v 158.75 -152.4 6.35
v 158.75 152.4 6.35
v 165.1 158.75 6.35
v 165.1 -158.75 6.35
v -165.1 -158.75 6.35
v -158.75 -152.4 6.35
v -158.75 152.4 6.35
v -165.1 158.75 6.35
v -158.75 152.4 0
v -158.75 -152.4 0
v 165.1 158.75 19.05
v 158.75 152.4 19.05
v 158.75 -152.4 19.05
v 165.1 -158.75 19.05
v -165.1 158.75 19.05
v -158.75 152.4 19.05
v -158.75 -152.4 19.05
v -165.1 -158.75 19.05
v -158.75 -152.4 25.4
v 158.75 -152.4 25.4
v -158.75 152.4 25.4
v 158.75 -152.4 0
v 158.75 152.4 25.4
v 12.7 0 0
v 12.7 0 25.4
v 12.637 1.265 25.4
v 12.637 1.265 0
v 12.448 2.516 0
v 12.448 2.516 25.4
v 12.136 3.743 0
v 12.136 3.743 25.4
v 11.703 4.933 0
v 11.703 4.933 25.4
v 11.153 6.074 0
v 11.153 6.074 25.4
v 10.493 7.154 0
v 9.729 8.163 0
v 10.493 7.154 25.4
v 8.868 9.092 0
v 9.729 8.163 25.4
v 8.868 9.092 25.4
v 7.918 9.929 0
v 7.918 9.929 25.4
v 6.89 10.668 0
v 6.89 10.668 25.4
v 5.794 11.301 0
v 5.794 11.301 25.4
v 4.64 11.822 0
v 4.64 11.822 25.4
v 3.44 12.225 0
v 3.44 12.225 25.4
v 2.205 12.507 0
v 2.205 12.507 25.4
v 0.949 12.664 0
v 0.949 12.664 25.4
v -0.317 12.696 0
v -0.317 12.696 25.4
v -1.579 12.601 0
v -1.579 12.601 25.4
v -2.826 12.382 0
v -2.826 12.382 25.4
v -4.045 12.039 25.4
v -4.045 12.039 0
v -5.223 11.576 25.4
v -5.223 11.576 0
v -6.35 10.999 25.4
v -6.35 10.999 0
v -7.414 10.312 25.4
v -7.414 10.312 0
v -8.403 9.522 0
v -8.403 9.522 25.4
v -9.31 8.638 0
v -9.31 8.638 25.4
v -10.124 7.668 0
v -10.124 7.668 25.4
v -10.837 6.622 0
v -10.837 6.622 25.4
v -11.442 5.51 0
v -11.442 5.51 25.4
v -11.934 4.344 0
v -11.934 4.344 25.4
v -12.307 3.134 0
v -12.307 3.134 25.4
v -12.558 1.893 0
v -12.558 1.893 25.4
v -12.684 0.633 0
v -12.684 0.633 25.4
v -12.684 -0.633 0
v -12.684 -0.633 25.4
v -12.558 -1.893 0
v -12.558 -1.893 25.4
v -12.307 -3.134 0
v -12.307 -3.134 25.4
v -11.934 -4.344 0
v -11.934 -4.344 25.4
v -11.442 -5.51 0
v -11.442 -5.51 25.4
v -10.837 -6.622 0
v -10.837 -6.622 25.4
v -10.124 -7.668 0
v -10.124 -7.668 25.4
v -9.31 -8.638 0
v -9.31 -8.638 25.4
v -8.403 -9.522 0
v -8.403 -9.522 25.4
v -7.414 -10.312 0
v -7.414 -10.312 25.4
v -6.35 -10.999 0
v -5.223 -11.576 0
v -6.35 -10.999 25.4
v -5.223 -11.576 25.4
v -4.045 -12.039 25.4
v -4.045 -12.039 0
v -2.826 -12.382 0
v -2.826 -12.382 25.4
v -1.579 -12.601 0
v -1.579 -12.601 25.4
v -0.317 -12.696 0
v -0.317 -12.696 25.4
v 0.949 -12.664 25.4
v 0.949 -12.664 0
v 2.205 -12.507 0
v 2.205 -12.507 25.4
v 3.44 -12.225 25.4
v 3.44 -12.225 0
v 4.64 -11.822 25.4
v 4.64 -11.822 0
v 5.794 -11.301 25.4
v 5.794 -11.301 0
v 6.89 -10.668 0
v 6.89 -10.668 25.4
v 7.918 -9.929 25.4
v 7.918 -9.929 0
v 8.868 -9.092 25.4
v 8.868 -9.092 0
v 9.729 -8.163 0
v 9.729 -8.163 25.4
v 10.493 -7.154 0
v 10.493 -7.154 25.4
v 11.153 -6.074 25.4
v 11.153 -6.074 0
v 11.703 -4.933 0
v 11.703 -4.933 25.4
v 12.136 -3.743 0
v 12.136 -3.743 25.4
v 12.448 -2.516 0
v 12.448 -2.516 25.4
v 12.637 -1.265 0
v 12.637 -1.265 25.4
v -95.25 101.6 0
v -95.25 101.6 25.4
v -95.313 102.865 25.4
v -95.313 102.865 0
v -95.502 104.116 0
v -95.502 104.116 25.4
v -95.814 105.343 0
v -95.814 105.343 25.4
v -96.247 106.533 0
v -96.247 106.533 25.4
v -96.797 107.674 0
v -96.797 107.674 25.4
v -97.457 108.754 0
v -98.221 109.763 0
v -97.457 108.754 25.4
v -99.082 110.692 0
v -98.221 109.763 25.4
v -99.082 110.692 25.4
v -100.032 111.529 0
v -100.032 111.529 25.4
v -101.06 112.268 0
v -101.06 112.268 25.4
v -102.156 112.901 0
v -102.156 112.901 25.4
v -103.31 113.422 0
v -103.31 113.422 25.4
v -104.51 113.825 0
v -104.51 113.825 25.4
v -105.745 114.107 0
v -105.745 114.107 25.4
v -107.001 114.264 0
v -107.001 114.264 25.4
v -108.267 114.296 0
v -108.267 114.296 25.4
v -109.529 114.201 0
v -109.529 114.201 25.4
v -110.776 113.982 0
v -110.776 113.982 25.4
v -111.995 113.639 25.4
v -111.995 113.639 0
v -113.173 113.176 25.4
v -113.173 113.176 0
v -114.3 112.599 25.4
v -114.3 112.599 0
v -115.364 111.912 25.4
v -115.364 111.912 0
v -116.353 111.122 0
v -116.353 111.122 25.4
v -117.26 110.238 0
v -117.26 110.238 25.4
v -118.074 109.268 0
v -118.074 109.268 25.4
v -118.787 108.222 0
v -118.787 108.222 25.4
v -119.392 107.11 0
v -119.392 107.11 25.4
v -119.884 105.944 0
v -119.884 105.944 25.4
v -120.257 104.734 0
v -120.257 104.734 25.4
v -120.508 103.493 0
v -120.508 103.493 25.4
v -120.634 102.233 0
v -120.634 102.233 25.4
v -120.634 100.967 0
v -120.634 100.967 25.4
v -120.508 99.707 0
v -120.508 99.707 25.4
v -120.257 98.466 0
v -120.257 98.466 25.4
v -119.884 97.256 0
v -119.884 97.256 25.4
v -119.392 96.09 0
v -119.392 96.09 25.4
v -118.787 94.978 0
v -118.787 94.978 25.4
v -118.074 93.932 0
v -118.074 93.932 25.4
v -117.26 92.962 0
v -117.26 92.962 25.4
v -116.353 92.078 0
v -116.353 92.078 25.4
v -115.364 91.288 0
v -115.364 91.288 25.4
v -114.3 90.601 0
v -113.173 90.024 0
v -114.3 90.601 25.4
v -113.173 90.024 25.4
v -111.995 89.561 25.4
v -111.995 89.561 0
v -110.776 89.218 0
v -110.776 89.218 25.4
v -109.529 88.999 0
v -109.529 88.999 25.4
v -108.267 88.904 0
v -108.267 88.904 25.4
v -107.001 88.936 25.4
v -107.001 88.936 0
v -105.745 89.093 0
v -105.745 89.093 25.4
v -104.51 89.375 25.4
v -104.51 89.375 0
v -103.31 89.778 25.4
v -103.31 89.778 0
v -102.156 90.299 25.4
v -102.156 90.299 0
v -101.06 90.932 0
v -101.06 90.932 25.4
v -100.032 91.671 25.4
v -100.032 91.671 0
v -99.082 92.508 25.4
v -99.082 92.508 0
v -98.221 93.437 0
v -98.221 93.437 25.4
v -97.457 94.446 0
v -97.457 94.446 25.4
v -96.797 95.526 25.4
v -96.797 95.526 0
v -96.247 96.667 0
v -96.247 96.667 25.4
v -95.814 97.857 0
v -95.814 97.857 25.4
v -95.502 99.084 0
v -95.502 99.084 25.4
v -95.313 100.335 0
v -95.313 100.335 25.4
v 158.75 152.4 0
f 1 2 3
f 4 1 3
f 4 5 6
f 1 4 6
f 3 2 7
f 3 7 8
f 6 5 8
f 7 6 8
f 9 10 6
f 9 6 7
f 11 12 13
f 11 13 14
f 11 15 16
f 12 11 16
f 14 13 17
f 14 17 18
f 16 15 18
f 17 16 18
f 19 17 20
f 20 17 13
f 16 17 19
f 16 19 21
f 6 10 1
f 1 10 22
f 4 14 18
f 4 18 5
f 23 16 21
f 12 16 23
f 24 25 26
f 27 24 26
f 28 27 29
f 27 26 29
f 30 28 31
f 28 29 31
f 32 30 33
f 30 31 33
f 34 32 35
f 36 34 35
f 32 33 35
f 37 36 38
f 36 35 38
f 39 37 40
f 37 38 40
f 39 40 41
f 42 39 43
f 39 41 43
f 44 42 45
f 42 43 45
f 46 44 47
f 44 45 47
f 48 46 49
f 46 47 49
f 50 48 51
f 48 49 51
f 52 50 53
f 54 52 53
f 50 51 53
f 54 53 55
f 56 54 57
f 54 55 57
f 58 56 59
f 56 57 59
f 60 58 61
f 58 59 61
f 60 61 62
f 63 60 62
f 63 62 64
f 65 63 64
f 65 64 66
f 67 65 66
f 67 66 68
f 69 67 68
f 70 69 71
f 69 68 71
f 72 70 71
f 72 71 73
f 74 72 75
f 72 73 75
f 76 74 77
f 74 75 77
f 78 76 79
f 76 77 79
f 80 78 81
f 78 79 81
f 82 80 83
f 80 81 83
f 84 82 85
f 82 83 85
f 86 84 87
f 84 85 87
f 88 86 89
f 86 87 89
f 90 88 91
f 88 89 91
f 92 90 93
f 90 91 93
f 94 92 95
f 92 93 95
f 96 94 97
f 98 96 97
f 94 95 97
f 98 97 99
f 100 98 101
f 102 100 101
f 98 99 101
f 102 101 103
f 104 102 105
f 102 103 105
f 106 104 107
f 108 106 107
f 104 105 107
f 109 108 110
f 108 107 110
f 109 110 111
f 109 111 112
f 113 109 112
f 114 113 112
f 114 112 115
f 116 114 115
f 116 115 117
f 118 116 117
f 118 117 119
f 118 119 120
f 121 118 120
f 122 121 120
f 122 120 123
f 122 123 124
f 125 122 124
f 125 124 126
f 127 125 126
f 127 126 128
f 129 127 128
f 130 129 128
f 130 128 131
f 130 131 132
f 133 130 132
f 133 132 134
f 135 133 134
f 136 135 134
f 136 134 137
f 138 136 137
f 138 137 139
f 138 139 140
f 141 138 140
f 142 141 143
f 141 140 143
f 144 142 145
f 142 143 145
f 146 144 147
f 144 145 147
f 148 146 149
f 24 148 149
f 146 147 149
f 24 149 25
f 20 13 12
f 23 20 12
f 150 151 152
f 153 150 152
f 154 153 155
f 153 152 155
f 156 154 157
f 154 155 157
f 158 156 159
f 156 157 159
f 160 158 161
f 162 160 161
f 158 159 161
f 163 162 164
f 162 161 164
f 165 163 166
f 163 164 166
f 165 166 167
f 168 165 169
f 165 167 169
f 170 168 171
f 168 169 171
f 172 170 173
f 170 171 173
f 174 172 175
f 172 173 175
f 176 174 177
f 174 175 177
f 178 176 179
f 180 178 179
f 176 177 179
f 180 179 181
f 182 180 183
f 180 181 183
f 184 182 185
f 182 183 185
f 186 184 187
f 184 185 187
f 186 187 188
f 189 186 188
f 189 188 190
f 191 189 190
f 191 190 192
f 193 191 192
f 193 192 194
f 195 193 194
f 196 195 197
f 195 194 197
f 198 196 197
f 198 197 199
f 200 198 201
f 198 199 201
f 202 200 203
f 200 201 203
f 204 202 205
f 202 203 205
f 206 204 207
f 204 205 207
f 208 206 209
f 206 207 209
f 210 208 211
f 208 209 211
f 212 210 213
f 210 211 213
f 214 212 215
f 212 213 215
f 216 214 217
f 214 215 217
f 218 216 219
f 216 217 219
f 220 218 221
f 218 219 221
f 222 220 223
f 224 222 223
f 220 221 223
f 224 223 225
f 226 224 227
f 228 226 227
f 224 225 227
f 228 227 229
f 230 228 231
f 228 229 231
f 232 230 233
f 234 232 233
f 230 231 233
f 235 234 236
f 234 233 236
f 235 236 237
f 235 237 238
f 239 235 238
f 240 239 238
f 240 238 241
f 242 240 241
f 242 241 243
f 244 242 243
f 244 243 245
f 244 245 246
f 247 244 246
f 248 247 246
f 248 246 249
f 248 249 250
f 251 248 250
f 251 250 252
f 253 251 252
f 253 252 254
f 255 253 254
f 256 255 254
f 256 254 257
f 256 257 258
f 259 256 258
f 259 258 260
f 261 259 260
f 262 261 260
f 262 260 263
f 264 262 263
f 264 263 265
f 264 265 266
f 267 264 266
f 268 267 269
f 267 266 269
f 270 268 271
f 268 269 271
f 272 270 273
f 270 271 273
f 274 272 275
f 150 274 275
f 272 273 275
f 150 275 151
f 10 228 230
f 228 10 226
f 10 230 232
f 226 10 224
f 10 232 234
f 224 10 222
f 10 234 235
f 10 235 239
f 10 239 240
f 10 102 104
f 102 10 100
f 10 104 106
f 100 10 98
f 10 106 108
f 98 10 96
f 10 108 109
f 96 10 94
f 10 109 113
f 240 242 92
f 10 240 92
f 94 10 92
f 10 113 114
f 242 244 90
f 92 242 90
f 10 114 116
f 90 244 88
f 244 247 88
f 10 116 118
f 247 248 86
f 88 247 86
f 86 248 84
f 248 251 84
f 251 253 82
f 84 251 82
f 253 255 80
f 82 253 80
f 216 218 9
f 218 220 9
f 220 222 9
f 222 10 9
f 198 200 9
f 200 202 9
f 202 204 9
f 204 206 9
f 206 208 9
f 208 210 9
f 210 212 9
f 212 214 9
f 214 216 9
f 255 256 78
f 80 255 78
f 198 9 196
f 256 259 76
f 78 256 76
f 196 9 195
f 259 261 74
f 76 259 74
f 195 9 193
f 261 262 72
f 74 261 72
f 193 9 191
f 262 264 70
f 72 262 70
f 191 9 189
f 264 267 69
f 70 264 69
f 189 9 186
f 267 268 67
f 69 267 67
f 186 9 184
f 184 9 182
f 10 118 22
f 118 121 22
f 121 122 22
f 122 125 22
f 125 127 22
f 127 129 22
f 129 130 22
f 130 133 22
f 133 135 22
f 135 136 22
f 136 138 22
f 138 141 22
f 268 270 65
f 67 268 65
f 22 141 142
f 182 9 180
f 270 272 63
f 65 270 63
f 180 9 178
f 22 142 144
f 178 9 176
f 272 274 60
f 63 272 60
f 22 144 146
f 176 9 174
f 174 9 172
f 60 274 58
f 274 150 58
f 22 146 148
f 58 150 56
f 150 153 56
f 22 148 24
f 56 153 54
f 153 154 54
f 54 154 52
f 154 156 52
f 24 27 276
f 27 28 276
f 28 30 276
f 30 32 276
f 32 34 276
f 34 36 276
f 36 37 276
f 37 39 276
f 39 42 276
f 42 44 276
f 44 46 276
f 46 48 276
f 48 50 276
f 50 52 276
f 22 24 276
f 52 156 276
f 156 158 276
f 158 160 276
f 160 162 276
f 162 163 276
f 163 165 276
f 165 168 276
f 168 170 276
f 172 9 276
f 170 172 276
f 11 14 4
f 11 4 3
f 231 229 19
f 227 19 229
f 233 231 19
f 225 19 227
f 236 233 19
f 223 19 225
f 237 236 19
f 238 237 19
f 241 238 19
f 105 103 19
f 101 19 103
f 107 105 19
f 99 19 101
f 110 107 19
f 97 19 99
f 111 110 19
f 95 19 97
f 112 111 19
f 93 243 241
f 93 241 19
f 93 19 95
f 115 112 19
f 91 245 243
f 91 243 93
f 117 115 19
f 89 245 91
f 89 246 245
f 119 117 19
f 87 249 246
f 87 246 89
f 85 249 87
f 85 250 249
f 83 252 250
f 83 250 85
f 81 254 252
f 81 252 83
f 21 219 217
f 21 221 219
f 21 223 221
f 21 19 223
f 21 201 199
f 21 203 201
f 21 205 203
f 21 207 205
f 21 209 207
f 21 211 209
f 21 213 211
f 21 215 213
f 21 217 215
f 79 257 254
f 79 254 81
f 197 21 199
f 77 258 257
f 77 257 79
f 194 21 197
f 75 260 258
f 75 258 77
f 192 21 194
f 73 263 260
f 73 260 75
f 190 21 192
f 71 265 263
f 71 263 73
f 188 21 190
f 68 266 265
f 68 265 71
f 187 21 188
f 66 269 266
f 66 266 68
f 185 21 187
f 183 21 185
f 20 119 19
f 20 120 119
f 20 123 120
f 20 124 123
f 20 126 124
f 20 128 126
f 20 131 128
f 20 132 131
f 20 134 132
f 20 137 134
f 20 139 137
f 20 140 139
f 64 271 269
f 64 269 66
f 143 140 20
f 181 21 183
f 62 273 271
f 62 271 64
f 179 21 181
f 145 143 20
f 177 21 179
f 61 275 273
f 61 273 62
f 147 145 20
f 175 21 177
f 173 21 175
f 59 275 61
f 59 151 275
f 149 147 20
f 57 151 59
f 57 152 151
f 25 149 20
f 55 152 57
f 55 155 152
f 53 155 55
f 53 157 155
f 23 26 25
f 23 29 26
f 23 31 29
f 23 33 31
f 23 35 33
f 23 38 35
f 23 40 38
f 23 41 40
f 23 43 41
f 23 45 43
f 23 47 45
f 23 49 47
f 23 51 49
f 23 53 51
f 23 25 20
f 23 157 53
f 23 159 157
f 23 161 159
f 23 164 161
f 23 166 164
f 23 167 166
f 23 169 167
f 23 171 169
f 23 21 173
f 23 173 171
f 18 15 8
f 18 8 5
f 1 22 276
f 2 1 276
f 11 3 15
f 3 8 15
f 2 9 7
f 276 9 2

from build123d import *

# Parameters (mm, degrees)
F0_W      = 317.5
F0_H      = 304.8
F1_DEPTH  = 25.4
F2_W      = 317.5
F2_H      = 12.7
F3_DEPTH  = 6.35
F4_W      = 317.5
F4_H      = 12.7
F5_DEPTH  = 6.35
F8_DEPTH  = 6.35
F9_DEPTH  = 6.35
F10_R     = 12.7
F11_DEPTH = 25.4
F12_R     = 12.7
F13_DEPTH = 25.4


with BuildPart() as f1:
    # F0 (on Top) → F1 (new body)
    with BuildSketch(Plane.XY):
        Rectangle(F0_W, F0_H)
    extrude(amount=F1_DEPTH)

    # F2 (on face) → F3 (join)
    with BuildSketch(Plane.XZ.offset(152.4)):
        with Locations((0, 12.7)):
            Rectangle(F2_W, F2_H)
    extrude(amount=F3_DEPTH)

    # F4 (on face) → F5 (join)
    with BuildSketch(Plane(origin=(0, 152.4, 0), x_dir=(-1, 0, 0), z_dir=(0, 1, 0))):
        with Locations((0, 12.7)):
            Rectangle(F4_W, F4_H)
    extrude(amount=F5_DEPTH)

    # F7 (on face) → F8 (join)
    with BuildSketch(Plane(origin=(-158.75, 0, 0), x_dir=(0, -1, 0), z_dir=(-1, 0, 0))):
        Polygon((-152.4, 19.05), (-158.75, 19.05), (-158.75, 6.35), (-152.4, 6.35), (152.4, 6.35), (158.75, 6.35), (158.75, 19.05), (152.4, 19.05), align=None)
    extrude(amount=F8_DEPTH)

    # F6 (on face) → F9 (join)
    with BuildSketch(Plane.YZ.offset(158.75)):
        Polygon((-152.4, 19.05), (-158.75, 19.05), (-158.75, 6.35), (-152.4, 6.35), (152.4, 6.35), (158.75, 6.35), (158.75, 19.05), (152.4, 19.05), align=None)
    extrude(amount=F9_DEPTH)

    # F10 (on face) → F11 (cut)
    with BuildSketch(Plane.XY.offset(25.4)):
        with Locations((-107.95, 101.6)):
            Circle(F10_R)
    extrude(amount=-F11_DEPTH, mode=Mode.SUBTRACT)

    # F12 (on face) → F13 (cut)
    with BuildSketch(Plane.XY.offset(25.4)):
        Circle(F12_R)
    extrude(amount=-F13_DEPTH, mode=Mode.SUBTRACT)


solid = f1.part
